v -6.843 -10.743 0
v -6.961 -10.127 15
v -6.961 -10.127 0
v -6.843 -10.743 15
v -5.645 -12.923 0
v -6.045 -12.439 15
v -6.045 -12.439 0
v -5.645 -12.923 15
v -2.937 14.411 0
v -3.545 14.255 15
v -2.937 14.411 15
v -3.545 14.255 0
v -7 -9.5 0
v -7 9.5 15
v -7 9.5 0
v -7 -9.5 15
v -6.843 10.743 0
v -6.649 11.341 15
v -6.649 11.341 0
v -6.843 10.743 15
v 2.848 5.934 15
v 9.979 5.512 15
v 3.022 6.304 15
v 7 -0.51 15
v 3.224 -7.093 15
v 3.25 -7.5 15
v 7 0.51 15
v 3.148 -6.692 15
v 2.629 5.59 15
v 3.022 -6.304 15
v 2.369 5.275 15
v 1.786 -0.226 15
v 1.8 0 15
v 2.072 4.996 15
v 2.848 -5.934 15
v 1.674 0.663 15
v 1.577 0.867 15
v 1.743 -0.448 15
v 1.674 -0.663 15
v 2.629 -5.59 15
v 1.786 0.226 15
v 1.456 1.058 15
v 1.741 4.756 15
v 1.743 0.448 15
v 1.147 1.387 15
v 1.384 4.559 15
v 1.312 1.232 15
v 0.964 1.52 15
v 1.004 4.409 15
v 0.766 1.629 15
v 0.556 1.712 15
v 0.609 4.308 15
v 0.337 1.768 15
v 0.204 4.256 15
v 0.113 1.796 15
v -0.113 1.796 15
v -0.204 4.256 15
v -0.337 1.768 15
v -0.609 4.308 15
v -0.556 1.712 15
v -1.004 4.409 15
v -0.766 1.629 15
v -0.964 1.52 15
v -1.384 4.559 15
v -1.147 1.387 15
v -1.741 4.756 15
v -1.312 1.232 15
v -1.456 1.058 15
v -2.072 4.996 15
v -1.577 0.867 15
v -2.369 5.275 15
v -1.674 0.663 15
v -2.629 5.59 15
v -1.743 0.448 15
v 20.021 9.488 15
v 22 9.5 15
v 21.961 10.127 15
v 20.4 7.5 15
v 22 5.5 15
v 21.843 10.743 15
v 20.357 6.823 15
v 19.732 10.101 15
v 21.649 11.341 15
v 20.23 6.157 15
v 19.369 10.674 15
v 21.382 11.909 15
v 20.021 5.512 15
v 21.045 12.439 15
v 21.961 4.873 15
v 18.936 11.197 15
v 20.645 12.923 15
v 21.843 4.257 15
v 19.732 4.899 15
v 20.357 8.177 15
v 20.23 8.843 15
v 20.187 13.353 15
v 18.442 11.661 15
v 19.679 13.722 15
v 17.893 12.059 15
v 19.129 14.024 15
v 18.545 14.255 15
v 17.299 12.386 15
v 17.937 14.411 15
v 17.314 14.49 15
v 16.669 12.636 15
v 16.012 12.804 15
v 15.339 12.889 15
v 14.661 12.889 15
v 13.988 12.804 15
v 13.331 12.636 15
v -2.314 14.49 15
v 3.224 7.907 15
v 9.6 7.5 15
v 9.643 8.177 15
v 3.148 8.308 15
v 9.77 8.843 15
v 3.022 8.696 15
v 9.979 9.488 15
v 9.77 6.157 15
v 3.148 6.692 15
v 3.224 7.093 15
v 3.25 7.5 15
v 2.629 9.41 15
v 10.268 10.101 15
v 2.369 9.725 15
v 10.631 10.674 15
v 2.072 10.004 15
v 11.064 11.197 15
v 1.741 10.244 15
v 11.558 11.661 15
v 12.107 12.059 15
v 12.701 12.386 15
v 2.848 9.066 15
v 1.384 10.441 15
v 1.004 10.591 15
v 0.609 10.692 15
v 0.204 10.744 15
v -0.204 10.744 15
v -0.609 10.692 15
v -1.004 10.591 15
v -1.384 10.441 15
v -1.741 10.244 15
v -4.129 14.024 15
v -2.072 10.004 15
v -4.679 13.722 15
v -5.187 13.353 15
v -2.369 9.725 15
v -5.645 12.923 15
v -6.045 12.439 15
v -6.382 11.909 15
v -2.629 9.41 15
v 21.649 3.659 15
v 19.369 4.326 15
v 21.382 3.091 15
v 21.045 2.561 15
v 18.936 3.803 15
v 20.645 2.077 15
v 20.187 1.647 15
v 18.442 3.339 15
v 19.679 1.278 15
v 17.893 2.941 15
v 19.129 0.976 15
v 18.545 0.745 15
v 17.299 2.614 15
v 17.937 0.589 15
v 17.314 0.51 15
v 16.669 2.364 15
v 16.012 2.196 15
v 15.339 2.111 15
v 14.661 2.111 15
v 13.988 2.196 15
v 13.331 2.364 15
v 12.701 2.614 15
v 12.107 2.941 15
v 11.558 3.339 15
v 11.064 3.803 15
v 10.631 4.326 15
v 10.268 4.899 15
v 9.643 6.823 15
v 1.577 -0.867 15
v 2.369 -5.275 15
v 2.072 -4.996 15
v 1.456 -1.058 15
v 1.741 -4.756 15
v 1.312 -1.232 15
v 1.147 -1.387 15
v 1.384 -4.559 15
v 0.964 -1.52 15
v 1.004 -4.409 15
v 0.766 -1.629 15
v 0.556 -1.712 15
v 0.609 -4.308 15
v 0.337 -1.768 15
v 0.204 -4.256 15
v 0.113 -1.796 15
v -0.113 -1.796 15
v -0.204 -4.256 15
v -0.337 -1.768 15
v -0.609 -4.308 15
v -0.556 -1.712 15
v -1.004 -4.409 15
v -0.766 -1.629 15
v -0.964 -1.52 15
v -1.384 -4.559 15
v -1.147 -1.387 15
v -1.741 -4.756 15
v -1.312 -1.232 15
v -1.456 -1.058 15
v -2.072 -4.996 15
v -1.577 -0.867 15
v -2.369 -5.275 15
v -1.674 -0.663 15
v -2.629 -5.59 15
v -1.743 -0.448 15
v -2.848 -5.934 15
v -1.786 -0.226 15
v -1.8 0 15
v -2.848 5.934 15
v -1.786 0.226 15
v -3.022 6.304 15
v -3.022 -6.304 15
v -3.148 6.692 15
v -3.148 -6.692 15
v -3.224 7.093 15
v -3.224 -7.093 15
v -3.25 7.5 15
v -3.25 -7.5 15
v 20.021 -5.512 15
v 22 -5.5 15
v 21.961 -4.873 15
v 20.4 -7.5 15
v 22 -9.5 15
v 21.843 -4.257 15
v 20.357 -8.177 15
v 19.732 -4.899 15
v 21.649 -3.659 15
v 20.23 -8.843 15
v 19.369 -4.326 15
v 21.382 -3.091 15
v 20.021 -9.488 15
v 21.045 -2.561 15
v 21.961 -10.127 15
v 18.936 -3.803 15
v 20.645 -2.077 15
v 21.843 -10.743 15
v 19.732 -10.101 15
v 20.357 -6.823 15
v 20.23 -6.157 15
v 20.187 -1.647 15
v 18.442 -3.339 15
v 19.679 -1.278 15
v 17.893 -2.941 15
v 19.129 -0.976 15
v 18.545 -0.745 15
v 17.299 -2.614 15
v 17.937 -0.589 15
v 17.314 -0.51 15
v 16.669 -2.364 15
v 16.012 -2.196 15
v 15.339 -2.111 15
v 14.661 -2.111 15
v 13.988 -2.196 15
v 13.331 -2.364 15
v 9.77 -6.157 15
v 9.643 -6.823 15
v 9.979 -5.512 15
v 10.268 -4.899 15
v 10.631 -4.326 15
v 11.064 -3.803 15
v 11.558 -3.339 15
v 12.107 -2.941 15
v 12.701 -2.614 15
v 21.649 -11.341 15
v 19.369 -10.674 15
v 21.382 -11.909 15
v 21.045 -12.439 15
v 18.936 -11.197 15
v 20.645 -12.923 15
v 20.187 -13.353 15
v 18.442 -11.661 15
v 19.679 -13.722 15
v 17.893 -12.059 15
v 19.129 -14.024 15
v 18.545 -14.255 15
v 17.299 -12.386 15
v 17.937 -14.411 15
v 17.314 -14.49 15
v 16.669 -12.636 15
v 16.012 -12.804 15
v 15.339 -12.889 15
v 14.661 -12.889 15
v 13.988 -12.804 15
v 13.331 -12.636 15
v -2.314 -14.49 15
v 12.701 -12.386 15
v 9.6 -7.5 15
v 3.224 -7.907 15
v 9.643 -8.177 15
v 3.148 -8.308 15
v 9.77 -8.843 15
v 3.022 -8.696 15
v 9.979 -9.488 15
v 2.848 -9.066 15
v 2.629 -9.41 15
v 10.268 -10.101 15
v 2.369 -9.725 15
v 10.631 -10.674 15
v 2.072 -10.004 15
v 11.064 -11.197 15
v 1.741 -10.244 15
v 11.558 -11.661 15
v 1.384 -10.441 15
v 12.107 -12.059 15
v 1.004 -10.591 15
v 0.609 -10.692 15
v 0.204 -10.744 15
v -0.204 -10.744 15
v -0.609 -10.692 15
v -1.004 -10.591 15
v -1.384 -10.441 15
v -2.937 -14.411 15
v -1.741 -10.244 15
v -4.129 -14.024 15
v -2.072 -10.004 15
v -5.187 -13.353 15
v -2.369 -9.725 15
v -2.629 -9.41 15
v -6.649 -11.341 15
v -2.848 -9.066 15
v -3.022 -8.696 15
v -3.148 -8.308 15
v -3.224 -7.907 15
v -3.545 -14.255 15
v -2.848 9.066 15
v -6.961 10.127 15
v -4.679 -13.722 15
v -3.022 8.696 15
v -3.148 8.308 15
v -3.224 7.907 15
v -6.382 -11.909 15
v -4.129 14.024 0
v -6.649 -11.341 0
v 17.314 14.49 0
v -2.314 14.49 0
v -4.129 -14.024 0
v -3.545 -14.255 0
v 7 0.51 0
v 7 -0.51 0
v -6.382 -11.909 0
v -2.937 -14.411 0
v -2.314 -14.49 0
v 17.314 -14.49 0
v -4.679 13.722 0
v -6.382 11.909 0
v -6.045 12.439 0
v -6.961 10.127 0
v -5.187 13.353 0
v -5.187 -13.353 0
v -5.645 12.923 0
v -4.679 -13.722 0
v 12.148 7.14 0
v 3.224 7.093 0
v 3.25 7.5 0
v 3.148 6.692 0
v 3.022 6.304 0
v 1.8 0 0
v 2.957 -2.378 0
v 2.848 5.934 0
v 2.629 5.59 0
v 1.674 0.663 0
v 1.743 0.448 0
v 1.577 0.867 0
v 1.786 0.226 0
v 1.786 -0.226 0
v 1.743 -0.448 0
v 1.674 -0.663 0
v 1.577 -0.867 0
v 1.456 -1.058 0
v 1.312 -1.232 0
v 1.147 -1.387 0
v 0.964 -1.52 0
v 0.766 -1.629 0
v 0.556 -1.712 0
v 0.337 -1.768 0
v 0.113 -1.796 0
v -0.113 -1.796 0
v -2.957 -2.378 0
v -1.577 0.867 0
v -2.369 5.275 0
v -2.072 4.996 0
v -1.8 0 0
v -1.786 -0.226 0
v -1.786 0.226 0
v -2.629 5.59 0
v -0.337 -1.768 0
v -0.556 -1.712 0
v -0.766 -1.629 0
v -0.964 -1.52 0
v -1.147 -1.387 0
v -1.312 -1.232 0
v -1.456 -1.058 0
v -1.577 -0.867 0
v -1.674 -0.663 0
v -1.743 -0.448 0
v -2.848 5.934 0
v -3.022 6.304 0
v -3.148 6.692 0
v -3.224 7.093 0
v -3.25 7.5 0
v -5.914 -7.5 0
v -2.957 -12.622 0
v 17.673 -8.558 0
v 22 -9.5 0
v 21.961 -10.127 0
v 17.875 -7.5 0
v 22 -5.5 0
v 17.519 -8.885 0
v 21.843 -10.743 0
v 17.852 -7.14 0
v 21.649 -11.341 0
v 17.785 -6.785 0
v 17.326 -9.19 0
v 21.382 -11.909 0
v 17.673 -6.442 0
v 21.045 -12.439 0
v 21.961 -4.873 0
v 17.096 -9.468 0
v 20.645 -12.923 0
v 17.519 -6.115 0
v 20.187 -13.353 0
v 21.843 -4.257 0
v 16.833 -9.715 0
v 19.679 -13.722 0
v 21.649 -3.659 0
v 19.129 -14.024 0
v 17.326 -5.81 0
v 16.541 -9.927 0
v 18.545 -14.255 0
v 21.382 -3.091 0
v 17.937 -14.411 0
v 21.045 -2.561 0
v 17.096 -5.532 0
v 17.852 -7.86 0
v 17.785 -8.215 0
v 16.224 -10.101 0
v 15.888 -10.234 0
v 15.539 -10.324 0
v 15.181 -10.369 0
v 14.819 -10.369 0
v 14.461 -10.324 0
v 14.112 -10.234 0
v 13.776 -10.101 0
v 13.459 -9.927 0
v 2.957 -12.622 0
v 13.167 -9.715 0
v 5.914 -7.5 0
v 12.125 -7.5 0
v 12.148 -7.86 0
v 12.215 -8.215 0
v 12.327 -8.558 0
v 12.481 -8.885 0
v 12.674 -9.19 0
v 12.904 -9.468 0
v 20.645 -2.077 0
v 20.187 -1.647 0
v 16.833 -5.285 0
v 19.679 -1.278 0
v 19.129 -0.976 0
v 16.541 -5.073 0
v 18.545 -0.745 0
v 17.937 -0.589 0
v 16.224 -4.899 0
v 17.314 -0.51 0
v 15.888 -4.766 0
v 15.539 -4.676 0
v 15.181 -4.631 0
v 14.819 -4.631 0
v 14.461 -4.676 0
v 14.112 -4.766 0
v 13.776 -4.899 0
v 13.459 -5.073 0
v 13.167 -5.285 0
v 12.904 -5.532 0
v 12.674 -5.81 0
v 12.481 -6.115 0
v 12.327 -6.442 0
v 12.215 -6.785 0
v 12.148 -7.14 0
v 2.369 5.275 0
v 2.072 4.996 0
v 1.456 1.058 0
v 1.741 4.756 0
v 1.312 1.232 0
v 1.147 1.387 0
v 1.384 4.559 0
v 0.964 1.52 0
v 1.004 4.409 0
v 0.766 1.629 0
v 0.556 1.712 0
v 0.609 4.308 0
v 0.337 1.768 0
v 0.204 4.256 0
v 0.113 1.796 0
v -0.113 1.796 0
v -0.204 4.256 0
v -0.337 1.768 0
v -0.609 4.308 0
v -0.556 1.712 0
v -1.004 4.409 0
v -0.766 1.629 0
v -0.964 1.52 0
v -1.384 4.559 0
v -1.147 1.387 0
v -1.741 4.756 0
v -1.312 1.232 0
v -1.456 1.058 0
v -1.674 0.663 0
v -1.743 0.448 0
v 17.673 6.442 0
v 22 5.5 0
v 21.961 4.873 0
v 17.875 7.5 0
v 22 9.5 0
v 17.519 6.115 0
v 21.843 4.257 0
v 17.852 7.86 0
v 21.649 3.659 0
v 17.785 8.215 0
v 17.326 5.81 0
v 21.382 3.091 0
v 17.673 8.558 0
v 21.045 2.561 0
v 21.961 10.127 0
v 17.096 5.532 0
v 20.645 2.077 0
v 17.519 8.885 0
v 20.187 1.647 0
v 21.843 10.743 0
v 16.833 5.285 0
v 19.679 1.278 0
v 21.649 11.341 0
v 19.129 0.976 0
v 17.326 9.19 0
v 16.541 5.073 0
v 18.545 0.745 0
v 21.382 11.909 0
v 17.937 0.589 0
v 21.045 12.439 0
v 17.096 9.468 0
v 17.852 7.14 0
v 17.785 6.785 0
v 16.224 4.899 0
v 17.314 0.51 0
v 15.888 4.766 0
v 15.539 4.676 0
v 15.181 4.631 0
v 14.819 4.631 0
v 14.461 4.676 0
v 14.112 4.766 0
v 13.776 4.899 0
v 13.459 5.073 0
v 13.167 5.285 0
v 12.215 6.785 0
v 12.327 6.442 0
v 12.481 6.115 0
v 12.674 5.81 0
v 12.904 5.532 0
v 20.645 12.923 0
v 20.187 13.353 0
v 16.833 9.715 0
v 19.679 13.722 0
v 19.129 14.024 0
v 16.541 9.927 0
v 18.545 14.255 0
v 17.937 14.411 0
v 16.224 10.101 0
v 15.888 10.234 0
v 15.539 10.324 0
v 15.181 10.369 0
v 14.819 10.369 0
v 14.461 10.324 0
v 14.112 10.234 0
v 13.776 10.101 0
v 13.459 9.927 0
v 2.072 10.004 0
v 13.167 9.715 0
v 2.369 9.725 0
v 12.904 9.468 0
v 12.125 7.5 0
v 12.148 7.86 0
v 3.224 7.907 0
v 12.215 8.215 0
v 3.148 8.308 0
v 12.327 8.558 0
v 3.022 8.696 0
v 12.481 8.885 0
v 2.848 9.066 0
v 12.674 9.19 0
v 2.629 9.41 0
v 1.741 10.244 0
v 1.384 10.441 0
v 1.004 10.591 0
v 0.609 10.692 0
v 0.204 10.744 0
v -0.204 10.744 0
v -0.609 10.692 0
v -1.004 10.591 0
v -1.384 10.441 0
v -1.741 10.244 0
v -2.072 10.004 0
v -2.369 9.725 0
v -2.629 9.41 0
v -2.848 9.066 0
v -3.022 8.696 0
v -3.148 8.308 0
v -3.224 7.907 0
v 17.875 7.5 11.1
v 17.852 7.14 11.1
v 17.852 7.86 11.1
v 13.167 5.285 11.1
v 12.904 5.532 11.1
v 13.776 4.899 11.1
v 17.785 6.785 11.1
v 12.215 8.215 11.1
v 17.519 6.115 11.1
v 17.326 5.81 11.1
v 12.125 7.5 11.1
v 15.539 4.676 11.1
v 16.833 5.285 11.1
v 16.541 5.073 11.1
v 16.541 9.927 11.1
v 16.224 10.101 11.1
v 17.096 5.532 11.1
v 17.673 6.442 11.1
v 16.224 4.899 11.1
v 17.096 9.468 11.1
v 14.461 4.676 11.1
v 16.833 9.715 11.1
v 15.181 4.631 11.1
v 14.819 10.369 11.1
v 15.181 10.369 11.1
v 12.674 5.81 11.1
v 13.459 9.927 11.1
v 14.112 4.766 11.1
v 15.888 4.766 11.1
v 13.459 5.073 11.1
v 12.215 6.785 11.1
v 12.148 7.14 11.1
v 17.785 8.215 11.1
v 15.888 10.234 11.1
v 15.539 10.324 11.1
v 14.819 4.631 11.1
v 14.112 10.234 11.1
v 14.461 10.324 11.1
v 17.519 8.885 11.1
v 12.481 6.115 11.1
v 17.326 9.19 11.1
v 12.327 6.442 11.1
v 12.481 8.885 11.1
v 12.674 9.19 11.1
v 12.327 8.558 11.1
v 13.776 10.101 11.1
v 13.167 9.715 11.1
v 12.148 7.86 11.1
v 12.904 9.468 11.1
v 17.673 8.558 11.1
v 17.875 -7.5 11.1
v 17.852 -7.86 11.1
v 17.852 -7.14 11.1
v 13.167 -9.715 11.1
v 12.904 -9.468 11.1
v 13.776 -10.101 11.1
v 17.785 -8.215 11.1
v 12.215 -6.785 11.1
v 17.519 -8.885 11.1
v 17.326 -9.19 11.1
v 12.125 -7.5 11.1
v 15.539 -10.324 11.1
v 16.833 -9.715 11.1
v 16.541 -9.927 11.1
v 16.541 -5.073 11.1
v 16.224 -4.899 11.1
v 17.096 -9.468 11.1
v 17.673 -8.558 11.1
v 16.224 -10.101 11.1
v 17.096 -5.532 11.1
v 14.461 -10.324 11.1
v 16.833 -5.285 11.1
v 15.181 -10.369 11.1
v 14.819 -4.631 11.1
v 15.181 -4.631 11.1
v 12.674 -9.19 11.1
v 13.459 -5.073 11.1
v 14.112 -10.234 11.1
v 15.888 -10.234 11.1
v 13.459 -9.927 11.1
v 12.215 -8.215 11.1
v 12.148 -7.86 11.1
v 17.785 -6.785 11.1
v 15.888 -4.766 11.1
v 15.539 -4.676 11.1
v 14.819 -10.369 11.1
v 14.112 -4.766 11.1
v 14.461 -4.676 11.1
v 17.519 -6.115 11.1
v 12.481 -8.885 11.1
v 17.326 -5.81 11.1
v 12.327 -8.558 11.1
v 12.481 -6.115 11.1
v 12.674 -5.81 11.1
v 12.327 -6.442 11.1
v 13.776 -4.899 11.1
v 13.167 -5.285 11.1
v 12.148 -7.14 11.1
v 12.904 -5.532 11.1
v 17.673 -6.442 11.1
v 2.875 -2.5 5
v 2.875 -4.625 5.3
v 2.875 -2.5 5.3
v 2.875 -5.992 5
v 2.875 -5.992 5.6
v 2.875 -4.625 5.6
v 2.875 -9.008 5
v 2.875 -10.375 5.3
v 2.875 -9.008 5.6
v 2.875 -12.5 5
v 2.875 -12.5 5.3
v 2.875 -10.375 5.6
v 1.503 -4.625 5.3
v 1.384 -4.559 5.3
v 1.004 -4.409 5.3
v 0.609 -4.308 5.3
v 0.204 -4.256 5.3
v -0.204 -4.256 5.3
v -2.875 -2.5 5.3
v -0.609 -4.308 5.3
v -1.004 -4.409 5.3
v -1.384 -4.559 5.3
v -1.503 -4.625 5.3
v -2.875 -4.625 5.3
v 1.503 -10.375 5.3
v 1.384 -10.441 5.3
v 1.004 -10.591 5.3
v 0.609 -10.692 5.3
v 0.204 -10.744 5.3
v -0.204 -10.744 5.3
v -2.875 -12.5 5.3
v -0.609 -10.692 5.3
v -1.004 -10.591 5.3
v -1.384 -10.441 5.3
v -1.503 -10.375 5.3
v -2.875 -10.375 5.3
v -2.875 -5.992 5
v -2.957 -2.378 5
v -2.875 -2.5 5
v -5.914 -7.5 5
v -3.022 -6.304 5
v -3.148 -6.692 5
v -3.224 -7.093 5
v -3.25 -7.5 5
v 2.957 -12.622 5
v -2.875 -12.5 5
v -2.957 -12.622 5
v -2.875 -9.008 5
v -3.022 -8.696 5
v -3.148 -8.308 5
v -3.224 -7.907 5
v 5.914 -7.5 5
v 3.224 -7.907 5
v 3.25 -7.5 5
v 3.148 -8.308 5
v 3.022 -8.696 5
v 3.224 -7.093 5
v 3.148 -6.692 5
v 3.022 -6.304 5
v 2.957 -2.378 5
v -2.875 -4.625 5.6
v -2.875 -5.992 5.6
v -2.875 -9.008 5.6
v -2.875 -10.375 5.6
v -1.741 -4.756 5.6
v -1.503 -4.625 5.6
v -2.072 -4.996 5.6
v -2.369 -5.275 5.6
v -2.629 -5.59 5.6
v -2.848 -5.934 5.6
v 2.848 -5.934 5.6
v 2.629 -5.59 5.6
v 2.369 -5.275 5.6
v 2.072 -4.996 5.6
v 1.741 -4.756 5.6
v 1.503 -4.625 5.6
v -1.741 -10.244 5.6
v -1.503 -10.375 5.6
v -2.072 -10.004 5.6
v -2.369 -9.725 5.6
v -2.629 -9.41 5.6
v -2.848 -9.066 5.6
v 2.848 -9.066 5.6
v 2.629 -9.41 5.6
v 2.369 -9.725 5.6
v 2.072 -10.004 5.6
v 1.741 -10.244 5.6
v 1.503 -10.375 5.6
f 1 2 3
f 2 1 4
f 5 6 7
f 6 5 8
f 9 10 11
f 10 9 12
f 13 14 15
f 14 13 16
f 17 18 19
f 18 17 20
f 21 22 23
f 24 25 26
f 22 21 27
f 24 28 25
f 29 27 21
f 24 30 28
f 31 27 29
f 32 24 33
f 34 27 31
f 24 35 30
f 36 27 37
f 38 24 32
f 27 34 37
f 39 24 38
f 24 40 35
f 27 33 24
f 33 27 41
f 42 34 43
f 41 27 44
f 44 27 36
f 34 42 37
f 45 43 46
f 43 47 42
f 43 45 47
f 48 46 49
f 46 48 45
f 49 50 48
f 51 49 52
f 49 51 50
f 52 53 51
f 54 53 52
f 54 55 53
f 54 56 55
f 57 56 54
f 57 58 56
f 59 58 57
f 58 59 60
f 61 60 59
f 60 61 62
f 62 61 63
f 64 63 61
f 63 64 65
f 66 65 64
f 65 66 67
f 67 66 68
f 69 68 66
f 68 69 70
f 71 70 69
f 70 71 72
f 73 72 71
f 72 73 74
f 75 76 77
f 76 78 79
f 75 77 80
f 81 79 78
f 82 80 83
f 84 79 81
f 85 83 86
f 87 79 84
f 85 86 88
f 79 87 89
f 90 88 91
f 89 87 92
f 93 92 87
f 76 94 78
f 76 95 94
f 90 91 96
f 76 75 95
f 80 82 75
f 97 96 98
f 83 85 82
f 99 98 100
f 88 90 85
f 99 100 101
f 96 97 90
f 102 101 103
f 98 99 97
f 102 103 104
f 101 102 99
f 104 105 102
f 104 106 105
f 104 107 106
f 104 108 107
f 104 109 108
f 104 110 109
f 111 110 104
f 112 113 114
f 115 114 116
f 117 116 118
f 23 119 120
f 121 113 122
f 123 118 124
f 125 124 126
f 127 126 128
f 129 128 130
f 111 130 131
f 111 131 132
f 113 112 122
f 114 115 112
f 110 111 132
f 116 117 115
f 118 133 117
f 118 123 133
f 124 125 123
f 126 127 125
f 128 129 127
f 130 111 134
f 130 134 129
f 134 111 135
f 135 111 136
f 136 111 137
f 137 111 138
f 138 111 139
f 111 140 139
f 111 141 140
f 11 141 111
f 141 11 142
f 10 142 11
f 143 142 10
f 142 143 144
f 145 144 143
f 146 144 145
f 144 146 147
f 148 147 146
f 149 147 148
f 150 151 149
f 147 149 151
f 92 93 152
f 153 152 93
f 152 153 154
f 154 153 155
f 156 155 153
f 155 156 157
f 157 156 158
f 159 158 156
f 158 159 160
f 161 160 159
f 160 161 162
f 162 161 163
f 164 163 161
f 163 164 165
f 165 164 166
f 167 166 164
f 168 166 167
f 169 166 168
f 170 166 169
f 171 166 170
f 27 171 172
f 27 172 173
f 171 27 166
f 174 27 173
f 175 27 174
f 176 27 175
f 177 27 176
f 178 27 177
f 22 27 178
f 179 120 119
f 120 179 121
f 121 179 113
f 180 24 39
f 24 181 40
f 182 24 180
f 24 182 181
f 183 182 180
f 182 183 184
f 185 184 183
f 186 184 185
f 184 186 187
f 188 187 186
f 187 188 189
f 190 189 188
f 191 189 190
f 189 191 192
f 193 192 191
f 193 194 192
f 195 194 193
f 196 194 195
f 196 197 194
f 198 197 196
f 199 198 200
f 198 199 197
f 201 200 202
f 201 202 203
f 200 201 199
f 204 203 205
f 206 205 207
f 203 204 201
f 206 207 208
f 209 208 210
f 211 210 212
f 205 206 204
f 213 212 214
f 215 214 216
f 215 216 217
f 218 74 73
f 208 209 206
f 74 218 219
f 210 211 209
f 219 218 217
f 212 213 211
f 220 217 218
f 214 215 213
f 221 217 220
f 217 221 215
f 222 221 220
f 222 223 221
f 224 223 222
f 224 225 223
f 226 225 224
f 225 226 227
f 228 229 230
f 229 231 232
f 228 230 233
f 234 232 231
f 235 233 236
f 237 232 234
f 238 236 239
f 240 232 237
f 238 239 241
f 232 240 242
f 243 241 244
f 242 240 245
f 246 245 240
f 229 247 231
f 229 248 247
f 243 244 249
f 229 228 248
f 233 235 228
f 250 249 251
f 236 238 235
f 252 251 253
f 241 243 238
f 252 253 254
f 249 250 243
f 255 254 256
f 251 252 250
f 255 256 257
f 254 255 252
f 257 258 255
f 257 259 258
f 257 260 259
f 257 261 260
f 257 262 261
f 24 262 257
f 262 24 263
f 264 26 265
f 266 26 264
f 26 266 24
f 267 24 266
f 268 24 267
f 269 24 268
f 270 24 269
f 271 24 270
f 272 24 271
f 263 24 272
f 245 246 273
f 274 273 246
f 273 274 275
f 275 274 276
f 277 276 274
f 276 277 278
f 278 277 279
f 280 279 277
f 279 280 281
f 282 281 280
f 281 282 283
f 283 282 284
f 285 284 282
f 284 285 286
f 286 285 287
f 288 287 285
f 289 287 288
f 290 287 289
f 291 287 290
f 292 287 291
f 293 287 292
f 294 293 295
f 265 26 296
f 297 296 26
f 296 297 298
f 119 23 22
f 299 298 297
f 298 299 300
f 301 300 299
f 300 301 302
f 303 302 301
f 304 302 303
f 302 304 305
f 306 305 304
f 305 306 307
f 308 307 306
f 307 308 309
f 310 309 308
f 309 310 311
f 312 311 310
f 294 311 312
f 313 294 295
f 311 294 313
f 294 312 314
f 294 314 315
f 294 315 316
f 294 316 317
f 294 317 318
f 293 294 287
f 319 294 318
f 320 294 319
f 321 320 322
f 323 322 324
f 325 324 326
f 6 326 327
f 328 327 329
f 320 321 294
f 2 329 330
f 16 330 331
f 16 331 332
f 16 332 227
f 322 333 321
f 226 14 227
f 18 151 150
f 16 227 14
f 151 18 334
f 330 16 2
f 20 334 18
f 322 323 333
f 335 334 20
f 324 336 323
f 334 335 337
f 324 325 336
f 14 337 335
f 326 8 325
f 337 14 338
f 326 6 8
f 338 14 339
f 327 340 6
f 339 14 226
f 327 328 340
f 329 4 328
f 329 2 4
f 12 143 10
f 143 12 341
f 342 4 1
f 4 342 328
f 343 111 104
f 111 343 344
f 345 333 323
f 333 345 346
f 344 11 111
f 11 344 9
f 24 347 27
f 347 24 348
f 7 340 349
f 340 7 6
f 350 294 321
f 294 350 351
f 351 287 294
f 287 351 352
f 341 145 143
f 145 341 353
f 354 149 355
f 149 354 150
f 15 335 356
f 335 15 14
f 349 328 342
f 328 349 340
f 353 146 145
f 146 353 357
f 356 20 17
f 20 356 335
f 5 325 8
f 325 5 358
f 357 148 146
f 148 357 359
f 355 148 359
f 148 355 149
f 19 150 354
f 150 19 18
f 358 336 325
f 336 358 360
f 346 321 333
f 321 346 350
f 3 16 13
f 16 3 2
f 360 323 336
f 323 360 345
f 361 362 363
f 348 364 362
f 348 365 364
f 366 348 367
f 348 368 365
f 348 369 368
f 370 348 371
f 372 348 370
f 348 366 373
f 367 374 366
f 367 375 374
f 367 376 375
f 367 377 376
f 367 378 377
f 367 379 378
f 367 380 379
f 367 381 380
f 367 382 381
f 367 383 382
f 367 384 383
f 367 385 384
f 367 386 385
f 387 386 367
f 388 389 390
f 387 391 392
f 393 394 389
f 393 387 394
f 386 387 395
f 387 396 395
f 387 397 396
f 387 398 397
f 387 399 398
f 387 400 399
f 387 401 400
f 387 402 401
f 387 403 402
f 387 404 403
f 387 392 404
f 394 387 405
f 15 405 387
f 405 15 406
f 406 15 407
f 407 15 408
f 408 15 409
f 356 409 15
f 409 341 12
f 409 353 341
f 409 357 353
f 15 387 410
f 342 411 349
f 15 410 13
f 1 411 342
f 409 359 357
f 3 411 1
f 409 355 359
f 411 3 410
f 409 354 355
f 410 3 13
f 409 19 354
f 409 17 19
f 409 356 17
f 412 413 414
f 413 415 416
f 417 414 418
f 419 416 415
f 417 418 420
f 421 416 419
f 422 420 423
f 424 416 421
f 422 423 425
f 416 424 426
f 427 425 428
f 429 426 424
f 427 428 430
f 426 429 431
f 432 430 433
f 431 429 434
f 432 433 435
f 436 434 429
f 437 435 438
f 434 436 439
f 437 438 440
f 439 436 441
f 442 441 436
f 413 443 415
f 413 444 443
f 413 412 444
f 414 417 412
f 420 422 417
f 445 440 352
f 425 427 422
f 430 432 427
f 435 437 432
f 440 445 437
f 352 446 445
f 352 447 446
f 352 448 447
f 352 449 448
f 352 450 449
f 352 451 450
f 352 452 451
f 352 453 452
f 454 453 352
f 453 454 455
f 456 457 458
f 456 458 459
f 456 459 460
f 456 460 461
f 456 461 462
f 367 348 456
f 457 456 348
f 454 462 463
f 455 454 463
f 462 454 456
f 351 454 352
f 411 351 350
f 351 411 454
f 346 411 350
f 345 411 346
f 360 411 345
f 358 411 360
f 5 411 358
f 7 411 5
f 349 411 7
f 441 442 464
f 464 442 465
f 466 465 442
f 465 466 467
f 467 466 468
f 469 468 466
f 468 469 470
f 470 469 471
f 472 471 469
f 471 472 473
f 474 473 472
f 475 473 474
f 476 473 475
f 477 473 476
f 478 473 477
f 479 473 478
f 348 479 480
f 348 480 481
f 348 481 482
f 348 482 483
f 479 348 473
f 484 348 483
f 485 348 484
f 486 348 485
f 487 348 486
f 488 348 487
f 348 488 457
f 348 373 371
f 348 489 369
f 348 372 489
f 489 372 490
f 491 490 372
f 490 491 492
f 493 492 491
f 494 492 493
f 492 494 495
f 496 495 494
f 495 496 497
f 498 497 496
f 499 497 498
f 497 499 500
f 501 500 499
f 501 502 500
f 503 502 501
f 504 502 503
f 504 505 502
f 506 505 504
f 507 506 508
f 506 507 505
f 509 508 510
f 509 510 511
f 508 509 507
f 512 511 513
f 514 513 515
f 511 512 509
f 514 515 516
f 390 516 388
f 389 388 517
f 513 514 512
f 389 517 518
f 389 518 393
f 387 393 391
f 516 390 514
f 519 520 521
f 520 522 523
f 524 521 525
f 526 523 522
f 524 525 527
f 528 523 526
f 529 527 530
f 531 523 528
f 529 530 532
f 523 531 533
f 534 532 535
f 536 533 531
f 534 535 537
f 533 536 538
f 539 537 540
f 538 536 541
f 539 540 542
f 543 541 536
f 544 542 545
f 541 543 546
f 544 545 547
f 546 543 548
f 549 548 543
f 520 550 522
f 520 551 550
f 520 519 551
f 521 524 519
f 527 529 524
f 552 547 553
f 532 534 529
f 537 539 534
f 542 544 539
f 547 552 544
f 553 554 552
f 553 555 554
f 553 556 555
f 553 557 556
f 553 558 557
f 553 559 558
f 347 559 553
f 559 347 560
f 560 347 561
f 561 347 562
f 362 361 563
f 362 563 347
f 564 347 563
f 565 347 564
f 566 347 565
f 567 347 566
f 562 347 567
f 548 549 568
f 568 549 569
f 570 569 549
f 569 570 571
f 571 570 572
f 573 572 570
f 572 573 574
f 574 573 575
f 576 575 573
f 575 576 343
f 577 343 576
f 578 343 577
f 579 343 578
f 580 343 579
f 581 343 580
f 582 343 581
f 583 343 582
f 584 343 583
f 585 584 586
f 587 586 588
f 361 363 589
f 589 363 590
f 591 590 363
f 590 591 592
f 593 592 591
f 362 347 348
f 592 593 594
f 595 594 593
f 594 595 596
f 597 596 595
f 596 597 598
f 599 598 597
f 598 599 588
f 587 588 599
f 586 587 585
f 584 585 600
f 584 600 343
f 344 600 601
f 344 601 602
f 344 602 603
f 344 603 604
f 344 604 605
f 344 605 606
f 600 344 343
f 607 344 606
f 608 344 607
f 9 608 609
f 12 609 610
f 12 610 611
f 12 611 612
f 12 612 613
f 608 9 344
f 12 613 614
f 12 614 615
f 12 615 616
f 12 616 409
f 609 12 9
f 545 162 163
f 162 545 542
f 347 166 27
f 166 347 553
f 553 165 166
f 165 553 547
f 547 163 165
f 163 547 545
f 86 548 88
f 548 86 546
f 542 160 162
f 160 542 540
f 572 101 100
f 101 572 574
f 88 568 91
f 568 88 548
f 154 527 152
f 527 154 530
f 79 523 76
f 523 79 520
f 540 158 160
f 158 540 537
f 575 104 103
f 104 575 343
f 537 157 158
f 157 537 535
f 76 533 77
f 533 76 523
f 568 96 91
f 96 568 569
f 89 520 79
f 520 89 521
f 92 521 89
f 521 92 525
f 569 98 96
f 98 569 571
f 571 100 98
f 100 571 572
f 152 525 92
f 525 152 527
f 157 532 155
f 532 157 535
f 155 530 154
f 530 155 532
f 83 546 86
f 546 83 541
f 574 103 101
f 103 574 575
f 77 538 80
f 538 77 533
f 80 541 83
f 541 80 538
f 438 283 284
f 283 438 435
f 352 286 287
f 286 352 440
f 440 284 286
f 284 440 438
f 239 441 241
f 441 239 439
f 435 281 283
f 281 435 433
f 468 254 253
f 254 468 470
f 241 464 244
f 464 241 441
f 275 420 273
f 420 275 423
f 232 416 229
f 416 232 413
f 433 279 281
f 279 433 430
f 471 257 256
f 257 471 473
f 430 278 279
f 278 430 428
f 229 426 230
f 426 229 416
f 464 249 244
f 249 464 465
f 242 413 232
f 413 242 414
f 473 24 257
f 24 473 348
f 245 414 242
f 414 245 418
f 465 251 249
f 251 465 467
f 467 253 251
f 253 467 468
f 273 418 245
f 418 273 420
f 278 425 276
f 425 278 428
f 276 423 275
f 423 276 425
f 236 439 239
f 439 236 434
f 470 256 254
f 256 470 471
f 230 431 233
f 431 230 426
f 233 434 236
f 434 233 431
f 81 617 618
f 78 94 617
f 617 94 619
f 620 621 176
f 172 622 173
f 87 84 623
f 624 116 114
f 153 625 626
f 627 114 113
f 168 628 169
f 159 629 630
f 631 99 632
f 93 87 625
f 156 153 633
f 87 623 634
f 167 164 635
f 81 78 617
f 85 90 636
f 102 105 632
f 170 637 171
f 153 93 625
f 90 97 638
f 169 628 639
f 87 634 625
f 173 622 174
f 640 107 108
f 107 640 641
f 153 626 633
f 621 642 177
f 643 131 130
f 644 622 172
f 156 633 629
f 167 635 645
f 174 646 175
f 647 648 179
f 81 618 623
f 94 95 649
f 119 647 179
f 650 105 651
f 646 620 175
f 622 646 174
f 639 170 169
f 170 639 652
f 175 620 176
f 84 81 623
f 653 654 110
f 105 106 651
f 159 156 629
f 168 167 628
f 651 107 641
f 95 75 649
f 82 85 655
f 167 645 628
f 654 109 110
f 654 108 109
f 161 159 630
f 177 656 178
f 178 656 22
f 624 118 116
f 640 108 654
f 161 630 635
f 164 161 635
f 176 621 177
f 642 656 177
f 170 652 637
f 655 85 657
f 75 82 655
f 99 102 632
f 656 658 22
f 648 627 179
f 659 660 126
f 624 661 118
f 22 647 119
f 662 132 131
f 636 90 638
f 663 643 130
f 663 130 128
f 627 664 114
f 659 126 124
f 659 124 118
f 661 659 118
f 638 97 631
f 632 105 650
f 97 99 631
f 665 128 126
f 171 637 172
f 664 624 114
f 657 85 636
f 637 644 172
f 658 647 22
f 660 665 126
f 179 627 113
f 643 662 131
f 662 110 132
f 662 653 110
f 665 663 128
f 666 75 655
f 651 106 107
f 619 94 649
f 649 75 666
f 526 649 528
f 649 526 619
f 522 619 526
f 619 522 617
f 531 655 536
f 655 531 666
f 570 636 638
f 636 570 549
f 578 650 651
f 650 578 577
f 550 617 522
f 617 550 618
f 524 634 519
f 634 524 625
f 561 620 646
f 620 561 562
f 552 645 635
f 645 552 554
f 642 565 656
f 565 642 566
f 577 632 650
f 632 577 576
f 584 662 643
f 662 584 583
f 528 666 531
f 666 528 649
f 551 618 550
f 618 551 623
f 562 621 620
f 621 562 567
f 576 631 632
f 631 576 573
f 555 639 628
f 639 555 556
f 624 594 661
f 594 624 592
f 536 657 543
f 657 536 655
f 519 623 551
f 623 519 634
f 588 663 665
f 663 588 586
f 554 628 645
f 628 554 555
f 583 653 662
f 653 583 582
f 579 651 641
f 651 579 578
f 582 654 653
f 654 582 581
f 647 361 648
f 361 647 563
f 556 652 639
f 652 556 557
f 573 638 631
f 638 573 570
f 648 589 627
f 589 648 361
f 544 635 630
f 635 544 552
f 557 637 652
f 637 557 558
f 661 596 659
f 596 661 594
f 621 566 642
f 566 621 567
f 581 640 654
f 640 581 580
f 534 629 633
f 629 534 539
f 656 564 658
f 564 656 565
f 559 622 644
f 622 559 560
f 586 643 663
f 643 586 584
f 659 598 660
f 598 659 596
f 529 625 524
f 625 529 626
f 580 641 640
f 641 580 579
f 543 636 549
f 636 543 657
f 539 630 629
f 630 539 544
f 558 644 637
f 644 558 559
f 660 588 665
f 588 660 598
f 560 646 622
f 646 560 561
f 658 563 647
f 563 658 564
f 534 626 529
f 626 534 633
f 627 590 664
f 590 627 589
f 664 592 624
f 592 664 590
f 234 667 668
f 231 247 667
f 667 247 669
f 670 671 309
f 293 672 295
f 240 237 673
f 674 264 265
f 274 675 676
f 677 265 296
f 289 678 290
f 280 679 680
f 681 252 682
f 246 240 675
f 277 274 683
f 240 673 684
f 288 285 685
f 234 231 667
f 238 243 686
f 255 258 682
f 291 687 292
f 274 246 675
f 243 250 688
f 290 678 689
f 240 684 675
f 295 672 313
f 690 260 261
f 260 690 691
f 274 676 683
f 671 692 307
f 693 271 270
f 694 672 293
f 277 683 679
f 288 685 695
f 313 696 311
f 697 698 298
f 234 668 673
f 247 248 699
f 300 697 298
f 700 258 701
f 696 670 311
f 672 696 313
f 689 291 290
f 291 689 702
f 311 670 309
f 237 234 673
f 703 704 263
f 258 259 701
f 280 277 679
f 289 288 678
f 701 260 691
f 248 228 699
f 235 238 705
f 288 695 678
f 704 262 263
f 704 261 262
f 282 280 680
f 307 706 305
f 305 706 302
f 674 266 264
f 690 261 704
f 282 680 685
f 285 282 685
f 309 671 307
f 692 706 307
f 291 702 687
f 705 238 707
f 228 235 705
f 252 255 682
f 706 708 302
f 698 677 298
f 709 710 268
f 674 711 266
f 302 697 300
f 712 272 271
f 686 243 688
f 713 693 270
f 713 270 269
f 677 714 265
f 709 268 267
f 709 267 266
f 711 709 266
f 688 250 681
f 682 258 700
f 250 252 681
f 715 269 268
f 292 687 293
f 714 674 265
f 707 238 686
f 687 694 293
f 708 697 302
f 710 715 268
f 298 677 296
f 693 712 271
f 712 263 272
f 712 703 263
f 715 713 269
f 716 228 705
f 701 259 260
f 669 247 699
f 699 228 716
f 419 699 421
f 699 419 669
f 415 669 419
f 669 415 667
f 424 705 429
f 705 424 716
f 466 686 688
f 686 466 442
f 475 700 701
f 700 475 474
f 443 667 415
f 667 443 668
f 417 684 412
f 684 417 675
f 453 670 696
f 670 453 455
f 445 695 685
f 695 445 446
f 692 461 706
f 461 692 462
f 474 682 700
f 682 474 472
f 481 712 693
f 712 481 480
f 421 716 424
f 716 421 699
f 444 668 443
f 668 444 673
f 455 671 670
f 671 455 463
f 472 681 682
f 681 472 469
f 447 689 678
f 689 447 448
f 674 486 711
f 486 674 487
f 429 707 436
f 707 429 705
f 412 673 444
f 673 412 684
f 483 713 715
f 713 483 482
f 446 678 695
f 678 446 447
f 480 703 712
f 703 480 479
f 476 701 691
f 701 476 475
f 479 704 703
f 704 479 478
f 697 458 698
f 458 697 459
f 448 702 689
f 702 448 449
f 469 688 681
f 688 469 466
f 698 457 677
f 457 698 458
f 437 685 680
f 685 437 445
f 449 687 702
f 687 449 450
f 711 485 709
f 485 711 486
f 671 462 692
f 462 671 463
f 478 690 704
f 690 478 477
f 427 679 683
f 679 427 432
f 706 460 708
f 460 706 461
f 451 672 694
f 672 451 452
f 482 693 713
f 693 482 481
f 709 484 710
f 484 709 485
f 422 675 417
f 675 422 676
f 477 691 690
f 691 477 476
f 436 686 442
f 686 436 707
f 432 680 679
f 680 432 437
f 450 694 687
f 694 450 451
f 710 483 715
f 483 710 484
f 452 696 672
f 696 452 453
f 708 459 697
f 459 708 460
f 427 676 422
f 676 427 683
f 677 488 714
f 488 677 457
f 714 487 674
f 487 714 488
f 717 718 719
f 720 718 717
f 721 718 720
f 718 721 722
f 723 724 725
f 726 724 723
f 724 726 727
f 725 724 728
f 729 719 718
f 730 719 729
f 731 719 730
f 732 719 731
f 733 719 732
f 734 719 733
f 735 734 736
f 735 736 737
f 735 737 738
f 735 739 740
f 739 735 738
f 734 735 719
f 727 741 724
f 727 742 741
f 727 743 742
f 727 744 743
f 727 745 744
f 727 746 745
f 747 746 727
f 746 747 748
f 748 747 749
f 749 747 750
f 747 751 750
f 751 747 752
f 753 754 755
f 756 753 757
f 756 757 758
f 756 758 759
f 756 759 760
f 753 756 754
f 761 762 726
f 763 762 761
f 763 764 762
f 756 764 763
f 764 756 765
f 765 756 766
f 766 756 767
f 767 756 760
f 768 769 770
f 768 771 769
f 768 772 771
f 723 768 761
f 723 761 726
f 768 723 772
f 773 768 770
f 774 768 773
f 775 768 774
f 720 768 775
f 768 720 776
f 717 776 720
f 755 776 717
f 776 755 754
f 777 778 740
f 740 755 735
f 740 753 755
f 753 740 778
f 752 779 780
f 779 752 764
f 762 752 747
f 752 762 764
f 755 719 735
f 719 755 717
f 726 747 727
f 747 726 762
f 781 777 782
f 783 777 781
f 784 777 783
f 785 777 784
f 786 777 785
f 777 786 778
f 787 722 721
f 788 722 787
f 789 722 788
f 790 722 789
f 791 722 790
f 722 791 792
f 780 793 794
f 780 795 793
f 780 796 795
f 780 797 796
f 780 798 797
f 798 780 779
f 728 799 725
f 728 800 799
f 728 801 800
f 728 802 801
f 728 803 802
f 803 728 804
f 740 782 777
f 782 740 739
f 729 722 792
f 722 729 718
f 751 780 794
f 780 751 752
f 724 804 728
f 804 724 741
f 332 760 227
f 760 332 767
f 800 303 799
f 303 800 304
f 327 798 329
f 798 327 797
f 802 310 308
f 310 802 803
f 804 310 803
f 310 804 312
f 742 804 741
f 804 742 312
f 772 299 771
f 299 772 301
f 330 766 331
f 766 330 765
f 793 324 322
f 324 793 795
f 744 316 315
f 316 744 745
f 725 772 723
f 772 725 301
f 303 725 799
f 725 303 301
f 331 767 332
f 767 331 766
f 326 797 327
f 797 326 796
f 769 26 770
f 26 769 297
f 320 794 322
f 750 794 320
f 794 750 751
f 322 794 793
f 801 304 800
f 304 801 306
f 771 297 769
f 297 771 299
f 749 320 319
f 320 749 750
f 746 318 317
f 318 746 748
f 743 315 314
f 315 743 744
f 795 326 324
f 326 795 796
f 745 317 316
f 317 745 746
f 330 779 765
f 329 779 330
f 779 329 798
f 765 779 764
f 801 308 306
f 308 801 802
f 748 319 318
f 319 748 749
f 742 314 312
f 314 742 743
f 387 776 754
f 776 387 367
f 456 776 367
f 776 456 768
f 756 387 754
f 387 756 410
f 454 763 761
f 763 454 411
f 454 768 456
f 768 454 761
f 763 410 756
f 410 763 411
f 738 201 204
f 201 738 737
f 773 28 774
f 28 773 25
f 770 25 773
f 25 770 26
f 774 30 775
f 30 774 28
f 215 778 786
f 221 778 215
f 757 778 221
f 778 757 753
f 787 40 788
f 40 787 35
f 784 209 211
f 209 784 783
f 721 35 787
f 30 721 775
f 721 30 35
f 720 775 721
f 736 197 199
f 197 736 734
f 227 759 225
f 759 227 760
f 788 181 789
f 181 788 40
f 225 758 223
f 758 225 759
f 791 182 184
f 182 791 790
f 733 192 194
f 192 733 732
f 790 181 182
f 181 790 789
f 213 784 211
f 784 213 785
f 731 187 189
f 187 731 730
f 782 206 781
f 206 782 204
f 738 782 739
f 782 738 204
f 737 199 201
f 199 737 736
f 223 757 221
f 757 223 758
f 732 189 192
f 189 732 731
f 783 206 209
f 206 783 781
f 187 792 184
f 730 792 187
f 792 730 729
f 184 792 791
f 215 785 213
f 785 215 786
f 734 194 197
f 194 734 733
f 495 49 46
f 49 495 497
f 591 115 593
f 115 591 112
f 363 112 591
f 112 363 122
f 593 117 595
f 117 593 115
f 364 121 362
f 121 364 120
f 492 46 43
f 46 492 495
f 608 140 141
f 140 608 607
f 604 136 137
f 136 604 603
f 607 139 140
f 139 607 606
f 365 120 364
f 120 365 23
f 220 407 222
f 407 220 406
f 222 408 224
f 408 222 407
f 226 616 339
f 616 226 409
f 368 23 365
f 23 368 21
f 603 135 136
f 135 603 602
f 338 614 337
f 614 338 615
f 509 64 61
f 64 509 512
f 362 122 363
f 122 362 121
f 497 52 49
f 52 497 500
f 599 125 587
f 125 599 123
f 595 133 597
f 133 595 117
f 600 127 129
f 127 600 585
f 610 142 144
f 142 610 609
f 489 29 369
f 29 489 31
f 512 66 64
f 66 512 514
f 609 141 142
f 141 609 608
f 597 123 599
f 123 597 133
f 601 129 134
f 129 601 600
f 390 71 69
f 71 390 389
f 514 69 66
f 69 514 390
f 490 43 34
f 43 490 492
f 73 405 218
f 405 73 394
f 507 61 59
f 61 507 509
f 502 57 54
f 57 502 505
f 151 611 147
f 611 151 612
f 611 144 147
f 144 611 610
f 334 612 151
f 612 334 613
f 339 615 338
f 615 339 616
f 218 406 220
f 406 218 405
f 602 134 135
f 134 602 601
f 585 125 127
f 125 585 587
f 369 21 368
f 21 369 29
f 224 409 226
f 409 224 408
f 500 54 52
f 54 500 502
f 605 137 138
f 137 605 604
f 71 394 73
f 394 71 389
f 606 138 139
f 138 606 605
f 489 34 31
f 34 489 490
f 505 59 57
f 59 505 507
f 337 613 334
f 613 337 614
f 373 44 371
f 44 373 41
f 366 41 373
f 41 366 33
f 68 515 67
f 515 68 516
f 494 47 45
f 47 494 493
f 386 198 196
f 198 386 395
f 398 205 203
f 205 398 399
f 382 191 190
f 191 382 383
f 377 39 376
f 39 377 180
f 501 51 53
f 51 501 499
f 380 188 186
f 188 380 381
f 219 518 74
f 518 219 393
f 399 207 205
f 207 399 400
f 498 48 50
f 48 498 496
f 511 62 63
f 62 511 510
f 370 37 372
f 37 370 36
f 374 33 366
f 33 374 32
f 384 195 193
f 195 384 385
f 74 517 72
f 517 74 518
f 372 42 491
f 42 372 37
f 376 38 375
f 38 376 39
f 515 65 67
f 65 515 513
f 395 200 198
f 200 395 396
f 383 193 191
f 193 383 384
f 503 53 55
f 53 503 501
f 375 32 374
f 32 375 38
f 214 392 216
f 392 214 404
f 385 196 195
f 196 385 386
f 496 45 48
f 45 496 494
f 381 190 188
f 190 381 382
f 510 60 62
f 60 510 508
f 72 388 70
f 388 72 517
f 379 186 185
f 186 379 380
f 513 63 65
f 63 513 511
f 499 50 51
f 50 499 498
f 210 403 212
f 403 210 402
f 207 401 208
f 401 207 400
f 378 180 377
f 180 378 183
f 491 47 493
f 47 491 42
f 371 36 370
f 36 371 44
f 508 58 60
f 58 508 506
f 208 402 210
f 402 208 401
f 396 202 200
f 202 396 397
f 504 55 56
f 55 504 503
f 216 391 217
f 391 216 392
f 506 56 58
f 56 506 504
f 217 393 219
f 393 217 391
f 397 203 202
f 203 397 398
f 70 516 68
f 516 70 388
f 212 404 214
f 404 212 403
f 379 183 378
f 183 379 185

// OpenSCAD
$fn = 50;


difference() {
	union() {
		hull() {
			translate(v = [-2.0000000000, 9.5000000000, 0]) {
				cylinder(h = 15, r = 5);
			}
			translate(v = [2.0000000000, 9.5000000000, 0]) {
				cylinder(h = 15, r = 5);
			}
			translate(v = [-2.0000000000, -9.5000000000, 0]) {
				cylinder(h = 15, r = 5);
			}
			translate(v = [2.0000000000, -9.5000000000, 0]) {
				cylinder(h = 15, r = 5);
			}
		}
		translate(v = [7.5000000000, 7.5000000000, 0]) {
			hull() {
				translate(v = [-9.5000000000, 2.0000000000, 0]) {
					cylinder(h = 15, r = 5);
				}
				translate(v = [9.5000000000, 2.0000000000, 0]) {
					cylinder(h = 15, r = 5);
				}
				translate(v = [-9.5000000000, -2.0000000000, 0]) {
					cylinder(h = 15, r = 5);
				}
				translate(v = [9.5000000000, -2.0000000000, 0]) {
					cylinder(h = 15, r = 5);
				}
			}
		}
		translate(v = [7.5000000000, -7.5000000000, 0]) {
			hull() {
				translate(v = [-9.5000000000, 2.0000000000, 0]) {
					cylinder(h = 15, r = 5);
				}
				translate(v = [9.5000000000, 2.0000000000, 0]) {
					cylinder(h = 15, r = 5);
				}
				translate(v = [-9.5000000000, -2.0000000000, 0]) {
					cylinder(h = 15, r = 5);
				}
				translate(v = [9.5000000000, -2.0000000000, 0]) {
					cylinder(h = 15, r = 5);
				}
			}
		}
	}
	union() {
		translate(v = [15.0000000000, 7.5000000000, 15]) {
			rotate(a = [0, 0, 0]) {
				difference() {
					union() {
						#translate(v = [0, 0, -15.0000000000]) {
							cylinder(h = 15, r = 2.6000000000);
						}
						#translate(v = [0, 0, -3.9000000000]) {
							cylinder(h = 3.9000000000, r1 = 2.8750000000, r2 = 5.4000000000);
						}
						#translate(v = [0, 0, -15.0000000000]) {
							cylinder(h = 15, r = 2.8750000000);
						}
						#translate(v = [0, 0, -15.0000000000]) {
							cylinder(h = 15, r = 2.6000000000);
						}
					}
					union();
				}
			}
		}
		translate(v = [15.0000000000, -7.5000000000, 15]) {
			rotate(a = [0, 0, 0]) {
				difference() {
					union() {
						#translate(v = [0, 0, -15.0000000000]) {
							cylinder(h = 15, r = 2.6000000000);
						}
						#translate(v = [0, 0, -3.9000000000]) {
							cylinder(h = 3.9000000000, r1 = 2.8750000000, r2 = 5.4000000000);
						}
						#translate(v = [0, 0, -15.0000000000]) {
							cylinder(h = 15, r = 2.8750000000);
						}
						#translate(v = [0, 0, -15.0000000000]) {
							cylinder(h = 15, r = 2.6000000000);
						}
					}
					union();
				}
			}
		}
		translate(v = [0.0000000000, -7.5000000000, 0]) {
			rotate(a = [0, 0, 0]) {
				difference() {
					union() {
						#translate(v = [-2.8750000000, -5.0000000000, -0.3000000000]) {
							cube(size = [5.7500000000, 10, 0.3000000000]);
						}
						#translate(v = [-2.8750000000, -2.8750000000, -0.6000000000]) {
							cube(size = [5.7500000000, 5.7500000000, 0.3000000000]);
						}
						#translate(v = [-2.8750000000, -5.0000000000, 5]) {
							cube(size = [5.7500000000, 10, 0.3000000000]);
						}
						#translate(v = [-2.8750000000, -2.8750000000, 5.3000000000]) {
							cube(size = [5.7500000000, 5.7500000000, 0.3000000000]);
						}
						#translate(v = [0, 0, -100.0000000000]) {
							cylinder(h = 200, r = 3.2500000000);
						}
						#linear_extrude(height = 5) {
							polygon(points = [[5.9142500000, 0.0000000000], [2.9571250000, 5.1218907443], [-2.9571250000, 5.1218907443], [-5.9142500000, 0.0000000000], [-2.9571250000, -5.1218907443], [2.9571250000, -5.1218907443]]);
						}
						#translate(v = [-2.8750000000, -5.0000000000, -0.3000000000]) {
							cube(size = [5.7500000000, 10, 0.3000000000]);
						}
						#translate(v = [-2.8750000000, -2.8750000000, -0.6000000000]) {
							cube(size = [5.7500000000, 5.7500000000, 0.3000000000]);
						}
						#translate(v = [-2.8750000000, -5.0000000000, 5]) {
							cube(size = [5.7500000000, 10, 0.3000000000]);
						}
						#translate(v = [-2.8750000000, -2.8750000000, 5.3000000000]) {
							cube(size = [5.7500000000, 5.7500000000, 0.3000000000]);
						}
						#translate(v = [0, 0, -100.0000000000]) {
							cylinder(h = 200, r = 3.2500000000);
						}
						#translate(v = [-2.8750000000, -5.0000000000, -0.3000000000]) {
							cube(size = [5.7500000000, 10, 0.3000000000]);
						}
						#translate(v = [-2.8750000000, -2.8750000000, -0.6000000000]) {
							cube(size = [5.7500000000, 5.7500000000, 0.3000000000]);
						}
						#translate(v = [-2.8750000000, -5.0000000000, 5]) {
							cube(size = [5.7500000000, 10, 0.3000000000]);
						}
						#translate(v = [-2.8750000000, -2.8750000000, 5.3000000000]) {
							cube(size = [5.7500000000, 5.7500000000, 0.3000000000]);
						}
						#translate(v = [0, 0, -100.0000000000]) {
							cylinder(h = 200, r = 3.2500000000);
						}
					}
					union();
				}
			}
		}
		translate(v = [0.0000000000, -7.5000000000, 0]) {
			translate(v = [0, 0, -100]) {
				cylinder(h = 200, r = 3.2500000000);
			}
		}
		translate(v = [0.0000000000, 7.5000000000, 0]) {
			translate(v = [0, 0, -100]) {
				cylinder(h = 200, r = 3.2500000000);
			}
		}
		translate(v = [0.0000000000, -7.5000000000, 0]) {
			translate(v = [0, 0, -100]) {
				cylinder(h = 200, r = 1.8000000000);
			}
		}
		translate(v = [0, 0, -100]) {
			cylinder(h = 200, r = 1.8000000000);
		}
		translate(v = [0.0000000000, 7.5000000000, 0]) {
			translate(v = [0, 0, -100]) {
				cylinder(h = 200, r = 1.8000000000);
			}
		}
	}
}
